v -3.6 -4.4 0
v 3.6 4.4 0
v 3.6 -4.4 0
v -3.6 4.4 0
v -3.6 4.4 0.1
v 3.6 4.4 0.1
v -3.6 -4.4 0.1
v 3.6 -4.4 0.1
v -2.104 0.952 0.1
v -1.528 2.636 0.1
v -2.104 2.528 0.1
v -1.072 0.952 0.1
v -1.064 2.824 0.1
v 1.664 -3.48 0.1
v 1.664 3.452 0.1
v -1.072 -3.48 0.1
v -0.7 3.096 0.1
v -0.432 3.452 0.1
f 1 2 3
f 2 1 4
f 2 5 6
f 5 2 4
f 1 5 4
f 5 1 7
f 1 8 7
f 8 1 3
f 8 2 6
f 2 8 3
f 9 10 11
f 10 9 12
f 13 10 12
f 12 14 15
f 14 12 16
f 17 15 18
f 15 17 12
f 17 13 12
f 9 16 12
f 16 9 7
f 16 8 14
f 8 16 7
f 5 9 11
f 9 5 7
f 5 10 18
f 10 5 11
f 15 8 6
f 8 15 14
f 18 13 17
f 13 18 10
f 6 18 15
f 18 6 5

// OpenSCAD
// file: ../p/4-4edge.scad
use <../lib.scad>
$fa=1; $fs=0.2;
function ldraw_lib__4_4edge(realsolid=false) = [
// 0 Circle 1.0
// 0 Name: 4-4edge.dat
// 0 Author: James Jessiman
// 0 !LDRAW_ORG Primitive UPDATE 2017-01
// 0 !LICENSE Licensed under CC BY 2.0 and CC BY 4.0 : see CAreadme.txt
// 
// 0 BFC CERTIFY CCW
  [0,"BFC","CERTIFY"],
  [0,"BFC","CCW"],
// 
// 0 !HISTORY 1998-12-15 [PTadmin] Official Update 1998-10
// 0 !HISTORY 2005-12-28 [PTadmin] Official Update 2005-01
// 0 !HISTORY 2007-06-24 [PTadmin] Header formatted for Contributor Agreement
// 0 !HISTORY 2008-07-01 [PTadmin] Official Update 2008-01
// 0 !HISTORY 2017-01-15 [Steffen] BFCed
// 0 !HISTORY 2017-12-30 [PTadmin] Official Update 2017-01
// 
// 
// 2 24 1 0 0 0.9239 0 0.3827
  [2,24,1,0,0,0.9239,0,0.3827],
// 2 24 0.9239 0 0.3827 0.7071 0 0.7071
  [2,24,0.9239,0,0.3827,0.7071,0,0.7071],
// 2 24 0.7071 0 0.7071 0.3827 0 0.9239
  [2,24,0.7071,0,0.7071,0.3827,0,0.9239],
// 2 24 0.3827 0 0.9239 0 0 1
  [2,24,0.3827,0,0.9239,0,0,1],
// 2 24 0 0 1 -0.3827 0 0.9239
  [2,24,0,0,1,-0.3827,0,0.9239],
// 2 24 -0.3827 0 0.9239 -0.7071 0 0.7071
  [2,24,-0.3827,0,0.9239,-0.7071,0,0.7071],
// 2 24 -0.7071 0 0.7071 -0.9239 0 0.3827
  [2,24,-0.7071,0,0.7071,-0.9239,0,0.3827],
// 2 24 -0.9239 0 0.3827 -1 0 -0
  [2,24,-0.9239,0,0.3827,-1,0,-0],
// 2 24 -1 0 -0 -0.9239 0 -0.3827
  [2,24,-1,0,-0,-0.9239,0,-0.3827],
// 2 24 -0.9239 0 -0.3827 -0.7071 0 -0.7071
  [2,24,-0.9239,0,-0.3827,-0.7071,0,-0.7071],
// 2 24 -0.7071 0 -0.7071 -0.3827 0 -0.9239
  [2,24,-0.7071,0,-0.7071,-0.3827,0,-0.9239],
// 2 24 -0.3827 0 -0.9239 0 0 -1
  [2,24,-0.3827,0,-0.9239,0,0,-1],
// 2 24 0 0 -1 0.3827 0 -0.9239
  [2,24,0,0,-1,0.3827,0,-0.9239],
// 2 24 0.3827 0 -0.9239 0.7071 0 -0.7071
  [2,24,0.3827,0,-0.9239,0.7071,0,-0.7071],
// 2 24 0.7071 0 -0.7071 0.9239 0 -0.3827
  [2,24,0.7071,0,-0.7071,0.9239,0,-0.3827],
// 2 24 0.9239 0 -0.3827 1 0 0
  [2,24,0.9239,0,-0.3827,1,0,0],
];
module ldraw_lib__4_4edge(step=0, col=false, unit=2/5, alt=false, line=0.2, solid=!$preview)
    makepoly(ldraw_lib__4_4edge(solid), step=step, col=col, unit=unit, alt=alt, line=line, solid=solid);
ldraw_lib__4_4edge(line=0.2);
// file: ../p/4-4disc.scad
use <../lib.scad>
$fa=1; $fs=0.2;
function ldraw_lib__4_4disc(realsolid=false) = [
// 0 Disc 1.0
// 0 Name: 4-4disc.dat
// 0 Author: James Jessiman
// 0 !LDRAW_ORG Primitive UPDATE 2002-02
// 0 !LICENSE Licensed under CC BY 2.0 and CC BY 4.0 : see CAreadme.txt
// 
// 0 BFC CERTIFY CCW
  [0,"BFC","CERTIFY"],
  [0,"BFC","CCW"],
// 
// 0 !HISTORY 1998-12-15 [PTadmin] Official Update 1998-10
// 0 !HISTORY 2002-03-23 [sbliss] Added BFC statement
// 0 !HISTORY 2002-04-25 [PTadmin] Official Update 2002-02
// 0 !HISTORY 2007-06-24 [PTadmin] Header formatted for Contributor Agreement
// 0 !HISTORY 2008-07-01 [PTadmin] Official Update 2008-01
// 
// 
// 3 16 0 0 0 1 0 0 0.9239 0 0.3827
  [3,16,0,0,0,1,0,0,0.9239,0,0.3827],
// 3 16 0 0 0 0.9239 0 0.3827 0.7071 0 0.7071
  [3,16,0,0,0,0.9239,0,0.3827,0.7071,0,0.7071],
// 3 16 0 0 0 0.7071 0 0.7071 0.3827 0 0.9239
  [3,16,0,0,0,0.7071,0,0.7071,0.3827,0,0.9239],
// 3 16 0 0 0 0.3827 0 0.9239 0 0 1
  [3,16,0,0,0,0.3827,0,0.9239,0,0,1],
// 3 16 0 0 0 0 0 1 -0.3827 0 0.9239
  [3,16,0,0,0,0,0,1,-0.3827,0,0.9239],
// 3 16 0 0 0 -0.3827 0 0.9239 -0.7071 0 0.7071
  [3,16,0,0,0,-0.3827,0,0.9239,-0.7071,0,0.7071],
// 3 16 0 0 0 -0.7071 0 0.7071 -0.9239 0 0.3827
  [3,16,0,0,0,-0.7071,0,0.7071,-0.9239,0,0.3827],
// 3 16 0 0 0 -0.9239 0 0.3827 -1 0 -0
  [3,16,0,0,0,-0.9239,0,0.3827,-1,0,-0],
// 3 16 0 0 0 -1 0 -0 -0.9239 0 -0.3827
  [3,16,0,0,0,-1,0,-0,-0.9239,0,-0.3827],
// 3 16 0 0 0 -0.9239 0 -0.3827 -0.7071 0 -0.7071
  [3,16,0,0,0,-0.9239,0,-0.3827,-0.7071,0,-0.7071],
// 3 16 0 0 0 -0.7071 0 -0.7071 -0.3827 0 -0.9239
  [3,16,0,0,0,-0.7071,0,-0.7071,-0.3827,0,-0.9239],
// 3 16 0 0 0 -0.3827 0 -0.9239 0 0 -1
  [3,16,0,0,0,-0.3827,0,-0.9239,0,0,-1],
// 3 16 0 0 0 0 0 -1 0.3827 0 -0.9239
  [3,16,0,0,0,0,0,-1,0.3827,0,-0.9239],
// 3 16 0 0 0 0.3827 0 -0.9239 0.7071 0 -0.7071
  [3,16,0,0,0,0.3827,0,-0.9239,0.7071,0,-0.7071],
// 3 16 0 0 0 0.7071 0 -0.7071 0.9239 0 -0.3827
  [3,16,0,0,0,0.7071,0,-0.7071,0.9239,0,-0.3827],
// 3 16 0 0 0 0.9239 0 -0.3827 1 0 0
  [3,16,0,0,0,0.9239,0,-0.3827,1,0,0],
// 0
];
module ldraw_lib__4_4disc(step=0, col=false, unit=2/5, alt=false, line=0.2, solid=!$preview)
    makepoly(ldraw_lib__4_4disc(solid), step=step, col=col, unit=unit, alt=alt, line=line, solid=solid);
ldraw_lib__4_4disc(line=0.2);
// file: ../p/4-4cyli.scad
use <../lib.scad>
$fa=1; $fs=0.2;
function ldraw_lib__4_4cyli(realsolid=false) = [
// 0 Cylinder 1.0
// 0 Name: 4-4cyli.dat
// 0 Author: James Jessiman
// 0 !LDRAW_ORG Primitive UPDATE 2005-01
// 0 !LICENSE Licensed under CC BY 2.0 and CC BY 4.0 : see CAreadme.txt
// 
// 0 BFC CERTIFY CCW
  [0,"BFC","CERTIFY"],
  [0,"BFC","CCW"],
// 
// 0 !HISTORY 1998-12-15 [PTadmin] Official Update 1998-10
// 0 !HISTORY 2002-03-23 [sbliss] Added BFC statement; merged headers from files in distributions LDraw 0.27 and Complete.
// 0 !HISTORY 2002-04-25 [PTadmin] Official Update 2002-02
// 0 !HISTORY 2004-12-14 [guyvivan] BFC CCW
// 0 !HISTORY 2005-12-28 [PTadmin] Official Update 2005-01
// 0 !HISTORY 2007-06-24 [PTadmin] Header formatted for Contributor Agreement
// 0 !HISTORY 2008-07-01 [PTadmin] Official Update 2008-01
// 
// 
// 4 16 1 1 0 0.9239 1 0.3827 0.9239 0 0.3827 1 0 0
  [4,16,1,1,0,0.9239,1,0.3827,0.9239,0,0.3827,1,0,0],
// 5 24 1 0 0 1 1 0 0.9239 0 0.3827 0.9239 0 -0.3827
  [5,24,1,0,0,1,1,0,0.9239,0,0.3827,0.9239,0,-0.3827],
// 4 16 0.9239 1 0.3827 0.7071 1 0.7071 0.7071 0 0.7071 0.9239 0 0.3827
  [4,16,0.9239,1,0.3827,0.7071,1,0.7071,0.7071,0,0.7071,0.9239,0,0.3827],
// 5 24 0.9239 0 0.3827 0.9239 1 0.3827 0.7071 0 0.7071 1 0 0
  [5,24,0.9239,0,0.3827,0.9239,1,0.3827,0.7071,0,0.7071,1,0,0],
// 4 16 0.7071 1 0.7071 0.3827 1 0.9239 0.3827 0 0.9239 0.7071 0 0.7071
  [4,16,0.7071,1,0.7071,0.3827,1,0.9239,0.3827,0,0.9239,0.7071,0,0.7071],
// 5 24 0.7071 0 0.7071 0.7071 1 0.7071 0.3827 0 0.9239 0.9239 0 0.3827
  [5,24,0.7071,0,0.7071,0.7071,1,0.7071,0.3827,0,0.9239,0.9239,0,0.3827],
// 4 16 0.3827 1 0.9239 0 1 1 0 0 1 0.3827 0 0.9239
  [4,16,0.3827,1,0.9239,0,1,1,0,0,1,0.3827,0,0.9239],
// 5 24 0.3827 0 0.9239 0.3827 1 0.9239 0 0 1 0.7071 0 0.7071
  [5,24,0.3827,0,0.9239,0.3827,1,0.9239,0,0,1,0.7071,0,0.7071],
// 4 16 0 1 1 -0.3827 1 0.9239 -0.3827 0 0.9239 0 0 1
  [4,16,0,1,1,-0.3827,1,0.9239,-0.3827,0,0.9239,0,0,1],
// 5 24 0 0 1 0 1 1 -0.3827 0 0.9239 0.3827 0 0.9239
  [5,24,0,0,1,0,1,1,-0.3827,0,0.9239,0.3827,0,0.9239],
// 4 16 -0.3827 1 0.9239 -0.7071 1 0.7071 -0.7071 0 0.7071 -0.3827 0 0.9239
  [4,16,-0.3827,1,0.9239,-0.7071,1,0.7071,-0.7071,0,0.7071,-0.3827,0,0.9239],
// 5 24 -0.3827 0 0.9239 -0.3827 1 0.9239 -0.7071 0 0.7071 0 0 1
  [5,24,-0.3827,0,0.9239,-0.3827,1,0.9239,-0.7071,0,0.7071,0,0,1],
// 4 16 -0.7071 1 0.7071 -0.9239 1 0.3827 -0.9239 0 0.3827 -0.7071 0 0.7071
  [4,16,-0.7071,1,0.7071,-0.9239,1,0.3827,-0.9239,0,0.3827,-0.7071,0,0.7071],
// 5 24 -0.7071 0 0.7071 -0.7071 1 0.7071 -0.9239 0 0.3827 -0.3827 0 0.9239
  [5,24,-0.7071,0,0.7071,-0.7071,1,0.7071,-0.9239,0,0.3827,-0.3827,0,0.9239],
// 4 16 -0.9239 1 0.3827 -1 1 0 -1 0 0 -0.9239 0 0.3827
  [4,16,-0.9239,1,0.3827,-1,1,0,-1,0,0,-0.9239,0,0.3827],
// 5 24 -0.9239 0 0.3827 -0.9239 1 0.3827 -1 0 0 -0.7071 0 0.7071
  [5,24,-0.9239,0,0.3827,-0.9239,1,0.3827,-1,0,0,-0.7071,0,0.7071],
// 4 16 -1 1 0 -0.9239 1 -0.3827 -0.9239 0 -0.3827 -1 0 0
  [4,16,-1,1,0,-0.9239,1,-0.3827,-0.9239,0,-0.3827,-1,0,0],
// 5 24 -1 0 0 -1 1 0 -0.9239 0 -0.3827 -0.9239 0 0.3827
  [5,24,-1,0,0,-1,1,0,-0.9239,0,-0.3827,-0.9239,0,0.3827],
// 4 16 -0.9239 1 -0.3827 -0.7071 1 -0.7071 -0.7071 0 -0.7071 -0.9239 0 -0.3827
  [4,16,-0.9239,1,-0.3827,-0.7071,1,-0.7071,-0.7071,0,-0.7071,-0.9239,0,-0.3827],
// 5 24 -0.9239 0 -0.3827 -0.9239 1 -0.3827 -0.7071 0 -0.7071 -1 0 0
  [5,24,-0.9239,0,-0.3827,-0.9239,1,-0.3827,-0.7071,0,-0.7071,-1,0,0],
// 4 16 -0.7071 1 -0.7071 -0.3827 1 -0.9239 -0.3827 0 -0.9239 -0.7071 0 -0.7071
  [4,16,-0.7071,1,-0.7071,-0.3827,1,-0.9239,-0.3827,0,-0.9239,-0.7071,0,-0.7071],
// 5 24 -0.7071 0 -0.7071 -0.7071 1 -0.7071 -0.3827 0 -0.9239 -0.9239 0 -0.3827
  [5,24,-0.7071,0,-0.7071,-0.7071,1,-0.7071,-0.3827,0,-0.9239,-0.9239,0,-0.3827],
// 4 16 -0.3827 1 -0.9239 0 1 -1 0 0 -1 -0.3827 0 -0.9239
  [4,16,-0.3827,1,-0.9239,0,1,-1,0,0,-1,-0.3827,0,-0.9239],
// 5 24 -0.3827 0 -0.9239 -0.3827 1 -0.9239 0 0 -1 -0.7071 0 -0.7071
  [5,24,-0.3827,0,-0.9239,-0.3827,1,-0.9239,0,0,-1,-0.7071,0,-0.7071],
// 4 16 0 1 -1 0.3827 1 -0.9239 0.3827 0 -0.9239 0 0 -1
  [4,16,0,1,-1,0.3827,1,-0.9239,0.3827,0,-0.9239,0,0,-1],
// 5 24 0 0 -1 0 1 -1 0.3827 0 -0.9239 -0.3827 0 -0.9239
  [5,24,0,0,-1,0,1,-1,0.3827,0,-0.9239,-0.3827,0,-0.9239],
// 4 16 0.3827 1 -0.9239 0.7071 1 -0.7071 0.7071 0 -0.7071 0.3827 0 -0.9239
  [4,16,0.3827,1,-0.9239,0.7071,1,-0.7071,0.7071,0,-0.7071,0.3827,0,-0.9239],
// 5 24 0.3827 0 -0.9239 0.3827 1 -0.9239 0.7071 0 -0.7071 0 0 -1
  [5,24,0.3827,0,-0.9239,0.3827,1,-0.9239,0.7071,0,-0.7071,0,0,-1],
// 4 16 0.7071 1 -0.7071 0.9239 1 -0.3827 0.9239 0 -0.3827 0.7071 0 -0.7071
  [4,16,0.7071,1,-0.7071,0.9239,1,-0.3827,0.9239,0,-0.3827,0.7071,0,-0.7071],
// 5 24 0.7071 0 -0.7071 0.7071 1 -0.7071 0.9239 0 -0.3827 0.3827 0 -0.9239
  [5,24,0.7071,0,-0.7071,0.7071,1,-0.7071,0.9239,0,-0.3827,0.3827,0,-0.9239],
// 4 16 0.9239 1 -0.3827 1 1 0 1 0 0 0.9239 0 -0.3827
  [4,16,0.9239,1,-0.3827,1,1,0,1,0,0,0.9239,0,-0.3827],
// 5 24 0.9239 0 -0.3827 0.9239 1 -0.3827 1 0 0 0.7071 0 -0.7071
  [5,24,0.9239,0,-0.3827,0.9239,1,-0.3827,1,0,0,0.7071,0,-0.7071],
// 0
];
module ldraw_lib__4_4cyli(step=0, col=false, unit=2/5, alt=false, line=0.2, solid=!$preview)
    makepoly(ldraw_lib__4_4cyli(solid), step=step, col=col, unit=unit, alt=alt, line=line, solid=solid);
ldraw_lib__4_4cyli(line=0.2);
// file: ../p/stud3.scad
use <../lib.scad>
use <4-4cyli.scad>
use <4-4disc.scad>
use <4-4edge.scad>
$fa=1; $fs=0.2;
function ldraw_lib__stud3(realsolid=false) = realsolid ? 
    [openscad(translate([0,0,-eps()], o=cylinder(4+eps(), r=4)),2)] : [
// 0 Stud Tube Solid
// 0 Name: stud3.dat
// 0 Author: James Jessiman
// 0 !LDRAW_ORG Primitive UPDATE 2012-01
// 0 !LICENSE Licensed under CC BY 2.0 and CC BY 4.0 : see CAreadme.txt
// 
// 0 BFC CERTIFY CCW
  [0,"BFC","CERTIFY"],
  [0,"BFC","CCW"],
// 
// 0 !HISTORY 2002-04-04 [sbliss] Modified for BFC compliance
// 0 !HISTORY 2002-04-25 [PTadmin] Official Update 2002-02
// 0 !HISTORY 2007-06-24 [PTadmin] Header formatted for Contributor Agreement
// 0 !HISTORY 2008-07-01 [PTadmin] Official Update 2008-01
// 0 !HISTORY 2012-02-16 [Philo] Changed to CCW
// 0 !HISTORY 2012-03-30 [PTadmin] Official Update 2012-01
// 
// 
// 1 16 0 -4 0 4 0 0 0 1 0 0 0 4 4-4edge.dat
  [1,16,0,-4,0,4,0,0,0,1,0,0,0,4, ldraw_lib__4_4edge(realsolid)],
// 1 16 0 0 0 4 0 0 0 1 0 0 0 4 4-4edge.dat
  [1,16,0,0,0,4,0,0,0,1,0,0,0,4, ldraw_lib__4_4edge(realsolid)],
// 1 16 0 -4 0 4 0 0 0 1 0 0 0 4 4-4disc.dat
  [1,16,0,-4,0,4,0,0,0,1,0,0,0,4, ldraw_lib__4_4disc(realsolid)],
// 1 16 0 -4 0 4 0 0 0 4 0 0 0 4 4-4cyli.dat
  [1,16,0,-4,0,4,0,0,0,4,0,0,0,4, ldraw_lib__4_4cyli(realsolid)],
];
module ldraw_lib__stud3(step=0, col=false, unit=2/5, alt=false, line=0.2, solid=!$preview)
    makepoly(ldraw_lib__stud3(solid), step=step, col=col, unit=unit, alt=alt, line=line, solid=solid);
ldraw_lib__stud3(line=0.2);
// file: ../p/stud.scad
use <../lib.scad>
use <4-4cyli.scad>
use <4-4disc.scad>
use <4-4edge.scad>
$fa=1; $fs=0.2;
function ldraw_lib__stud(realsolid=false) = realsolid ? 
    [openscad(translate([0,0,-eps()], o=cylinder(4+eps(), r=6)),2)] : [
// 0 Stud
// 0 Name: stud.dat
// 0 Author: James Jessiman
// 0 !LDRAW_ORG Primitive UPDATE 2012-01
// 0 !LICENSE Licensed under CC BY 2.0 and CC BY 4.0 : see CAreadme.txt
// 
// 0 BFC CERTIFY CCW
  [0,"BFC","CERTIFY"],
  [0,"BFC","CCW"],
// 
// 0 !HISTORY 2002-04-04 [sbliss] Modified for BFC compliance
// 0 !HISTORY 2002-04-25 [PTadmin] Official Update 2002-02
// 0 !HISTORY 2007-06-24 [PTadmin] Header formatted for Contributor Agreement
// 0 !HISTORY 2008-07-01 [PTadmin] Official Update 2008-01
// 0 !HISTORY 2012-02-16 [Philo] Changed to CCW
// 0 !HISTORY 2012-03-30 [PTadmin] Official Update 2012-01
// 
// 
// 1 16 0 0 0 6 0 0 0 1 0 0 0 6 4-4edge.dat
  [1,16,0,0,0,6,0,0,0,1,0,0,0,6, ldraw_lib__4_4edge(realsolid)],
// 1 16 0 -4 0 6 0 0 0 1 0 0 0 6 4-4edge.dat
  [1,16,0,-4,0,6,0,0,0,1,0,0,0,6, ldraw_lib__4_4edge(realsolid)],
// 1 16 0 0 0 6 0 0 0 -4 0 0 0 6 4-4cyli.dat
  [1,16,0,0,0,6,0,0,0,-4,0,0,0,6, ldraw_lib__4_4cyli(realsolid)],
// 1 16 0 -4 0 6 0 0 0 1 0 0 0 6 4-4disc.dat
  [1,16,0,-4,0,6,0,0,0,1,0,0,0,6, ldraw_lib__4_4disc(realsolid)],
];
module ldraw_lib__stud(step=0, col=false, unit=2/5, alt=false, line=0.2, solid=!$preview)
    makepoly(ldraw_lib__stud(solid), step=step, col=col, unit=unit, alt=alt, line=line, solid=solid);
ldraw_lib__stud(line=0.2);
// file: ../p/box5.scad
use <../lib.scad>
$fa=1; $fs=0.2;
function ldraw_lib__box5(realsolid=false) = [
// 0 Box with 5 Faces and All Edges
// 0 Name: box5.dat
// 0 Author: James Jessiman
// 0 !LDRAW_ORG Primitive UPDATE 2012-01
// 0 !LICENSE Licensed under CC BY 2.0 and CC BY 4.0 : see CAreadme.txt
// 
// 0 BFC CERTIFY CCW
  [0,"BFC","CERTIFY"],
  [0,"BFC","CCW"],
// 
// 0 !HISTORY 2002-04-03 [sbliss] Modified for BFC compliance
// 0 !HISTORY 2002-04-25 [PTadmin] Official Update 2002-02
// 0 !HISTORY 2007-06-24 [PTadmin] Header formatted for Contributor Agreement
// 0 !HISTORY 2008-07-01 [PTadmin] Official Update 2008-01
// 0 !HISTORY 2012-02-16 [Philo] Changed to CCW
// 0 !HISTORY 2012-03-30 [PTadmin] Official Update 2012-01
// 
// 
// 2 24 1 1 1 -1 1 1
  [2,24,1,1,1,-1,1,1],
// 2 24 -1 1 1 -1 1 -1
  [2,24,-1,1,1,-1,1,-1],
// 2 24 -1 1 -1 1 1 -1
  [2,24,-1,1,-1,1,1,-1],
// 2 24 1 1 -1 1 1 1
  [2,24,1,1,-1,1,1,1],
// 2 24 1 0 1 -1 0 1
  [2,24,1,0,1,-1,0,1],
// 2 24 -1 0 1 -1 0 -1
  [2,24,-1,0,1,-1,0,-1],
// 2 24 -1 0 -1 1 0 -1
  [2,24,-1,0,-1,1,0,-1],
// 2 24 1 0 -1 1 0 1
  [2,24,1,0,-1,1,0,1],
// 2 24 1 0 1 1 1 1
  [2,24,1,0,1,1,1,1],
// 2 24 -1 0 1 -1 1 1
  [2,24,-1,0,1,-1,1,1],
// 2 24 1 0 -1 1 1 -1
  [2,24,1,0,-1,1,1,-1],
// 2 24 -1 0 -1 -1 1 -1
  [2,24,-1,0,-1,-1,1,-1],
// 4 16 -1 1 1 1 1 1 1 1 -1 -1 1 -1
  [4,16,-1,1,1,1,1,1,1,1,-1,-1,1,-1],
// 4 16 -1 1 1 -1 0 1 1 0 1 1 1 1
  [4,16,-1,1,1,-1,0,1,1,0,1,1,1,1],
// 4 16 -1 1 -1 -1 0 -1 -1 0 1 -1 1 1
  [4,16,-1,1,-1,-1,0,-1,-1,0,1,-1,1,1],
// 4 16 1 1 -1 1 0 -1 -1 0 -1 -1 1 -1
  [4,16,1,1,-1,1,0,-1,-1,0,-1,-1,1,-1],
// 4 16 1 1 1 1 0 1 1 0 -1 1 1 -1
  [4,16,1,1,1,1,0,1,1,0,-1,1,1,-1],
];
module ldraw_lib__box5(step=0, col=false, unit=2/5, alt=false, line=0.2, solid=!$preview)
    makepoly(ldraw_lib__box5(solid), step=step, col=col, unit=unit, alt=alt, line=line, solid=solid);
ldraw_lib__box5(line=0.2);
// file: ../p/box4t.scad
use <../lib.scad>
$fa=1; $fs=0.2;
function ldraw_lib__box4t(realsolid=false) = [
// 0 Box with 4 Adjacent Faces and All Edges
// 0 Name: box4t.dat
// 0 Author: Tore Eriksson [Tore_Eriksson]
// 0 !LDRAW_ORG Primitive UPDATE 2003-02
// 0 !LICENSE Licensed under CC BY 2.0 and CC BY 4.0 : see CAreadme.txt
// 
// 0 BFC CERTIFY CCW
  [0,"BFC","CERTIFY"],
  [0,"BFC","CCW"],
// 
// 0 !HISTORY 1997-09-29 [PTadmin] Official Update 1997-15
// 0 !HISTORY 2002-08-31 [izanette] Modified with WINDZ for BFC compliance
// 0 !HISTORY 2003-08-01 [PTadmin] Official Update 2003-02
// 0 !HISTORY 2007-06-24 [PTadmin] Header formatted for Contributor Agreement
// 0 !HISTORY 2008-07-01 [PTadmin] Official Update 2008-01
// 
// 
// 2 24 1 1 1 -1 1 1
  [2,24,1,1,1,-1,1,1],
// 2 24 -1 1 1 -1 1 -1
  [2,24,-1,1,1,-1,1,-1],
// 2 24 -1 1 -1 1 1 -1
  [2,24,-1,1,-1,1,1,-1],
// 2 24 1 1 -1 1 1 1
  [2,24,1,1,-1,1,1,1],
// 2 24 1 0 1 -1 0 1
  [2,24,1,0,1,-1,0,1],
// 2 24 -1 0 1 -1 0 -1
  [2,24,-1,0,1,-1,0,-1],
// 2 24 -1 0 -1 1 0 -1
  [2,24,-1,0,-1,1,0,-1],
// 2 24 1 0 -1 1 0 1
  [2,24,1,0,-1,1,0,1],
// 2 24 1 0 1 1 1 1
  [2,24,1,0,1,1,1,1],
// 2 24 -1 0 1 -1 1 1
  [2,24,-1,0,1,-1,1,1],
// 2 24 1 0 -1 1 1 -1
  [2,24,1,0,-1,1,1,-1],
// 2 24 -1 0 -1 -1 1 -1
  [2,24,-1,0,-1,-1,1,-1],
// 4 16 1 1 1 1 1 -1 -1 1 -1 -1 1 1
  [4,16,1,1,1,1,1,-1,-1,1,-1,-1,1,1],
// 4 16 1 1 1 -1 1 1 -1 0 1 1 0 1
  [4,16,1,1,1,-1,1,1,-1,0,1,1,0,1],
// 4 16 -1 1 1 -1 1 -1 -1 0 -1 -1 0 1
  [4,16,-1,1,1,-1,1,-1,-1,0,-1,-1,0,1],
// 0 4 16 -1 1 -1 -1 0 -1 1 0 -1 1 1 -1
// 4 16 1 1 -1 1 1 1 1 0 1 1 0 -1
  [4,16,1,1,-1,1,1,1,1,0,1,1,0,-1],
// 0
];
module ldraw_lib__box4t(step=0, col=false, unit=2/5, alt=false, line=0.2, solid=!$preview)
    makepoly(ldraw_lib__box4t(solid), step=step, col=col, unit=unit, alt=alt, line=line, solid=solid);
ldraw_lib__box4t(line=0.2);
// file: s/3004s01.scad
use <../../lib.scad>
use <../../p/box4t.scad>
use <../../p/box5.scad>
use <../../p/stud.scad>
use <../../p/stud3.scad>
$fa=1; $fs=0.2;
function ldraw_lib__s__3004s01(realsolid=false) = [
// 0 ~Brick  1 x  2 without Front Face
// 0 Name: s\3004s01.dat
// 0 Author: James Jessiman
// 0 !LDRAW_ORG Subpart UPDATE 2003-03
// 0 !LICENSE Licensed under CC BY 2.0 and CC BY 4.0 : see CAreadme.txt
// 
// 0 BFC CERTIFY CCW
  [0,"BFC","CERTIFY"],
  [0,"BFC","CCW"],
// 
// 0 !HISTORY 2003-09-07 [jriley] Subfiling, BFC
// 0 !HISTORY 2003-12-19 [PTadmin] Official Update 2003-03
// 0 !HISTORY 2007-08-29 [PTadmin] Header formatted for Contributor Agreement
// 0 !HISTORY 2008-07-01 [PTadmin] Official Update 2008-01
// 
// 
// 1 16 0 4 0 1 0 0 0 -5 0 0 0 1 stud3.dat
  [1,16,0,4,0,1,0,0,0,-5,0,0,0,1, ldraw_lib__stud3(realsolid)],
// 0 BFC INVERTNEXT
  [0,"BFC","INVERTNEXT"],
// 1 16 0 24 0 16 0 0 0 -20 0 0 0 6 box5.dat
  [1,16,0,24,0,16,0,0,0,-20,0,0,0,6, ldraw_lib__box5(realsolid)],
// 4 16 20 24 10 16 24 6 -16 24 6 -20 24 10
  [4,16,20,24,10,16,24,6,-16,24,6,-20,24,10],
// 4 16 -20 24 10 -16 24 6 -16 24 -6 -20 24 -10
  [4,16,-20,24,10,-16,24,6,-16,24,-6,-20,24,-10],
// 4 16 -20 24 -10 -16 24 -6 16 24 -6 20 24 -10
  [4,16,-20,24,-10,-16,24,-6,16,24,-6,20,24,-10],
// 4 16 20 24 -10 16 24 -6 16 24 6 20 24 10
  [4,16,20,24,-10,16,24,-6,16,24,6,20,24,10],
// 1 16 0 24 0 20 0 0 0 -24 0 0 0 10 box4t.dat
  [1,16,0,24,0,20,0,0,0,-24,0,0,0,10, ldraw_lib__box4t(realsolid)],
// 1 16 10 0 0 1 0 0 0 1 0 0 0 1 stud.dat
  [1,16,10,0,0,1,0,0,0,1,0,0,0,1, ldraw_lib__stud(realsolid)],
// 1 16 -10 0 0 1 0 0 0 1 0 0 0 1 stud.dat
  [1,16,-10,0,0,1,0,0,0,1,0,0,0,1, ldraw_lib__stud(realsolid)],
// 0
];
module ldraw_lib__s__3004s01(step=0, col=false, unit=2/5, alt=false, line=0.2, solid=!$preview)
    makepoly(ldraw_lib__s__3004s01(solid), step=step, col=col, unit=unit, alt=alt, line=line, solid=solid);
ldraw_lib__s__3004s01(line=0.2);
// file: 3004.scad
use <../lib.scad>
use <s/3004s01.scad>
$fa=1; $fs=0.2;
function ldraw_lib__3004(realsolid=false) = [
// 0 Brick  1 x  2
// 0 Name: 3004.dat
// 0 Author: James Jessiman
// 0 !LDRAW_ORG Part UPDATE 2022-05
// 0 !LICENSE Licensed under CC BY 2.0 and CC BY 4.0 : see CAreadme.txt
// 
// 0 BFC CERTIFY CCW
  [0,"BFC","CERTIFY"],
  [0,"BFC","CCW"],
// 
// 0 !HISTORY 2001-10-26 [PTadmin] Official Update 2001-01
// 0 !HISTORY 2002-05-07 {unknown} BFC Certification
// 0 !HISTORY 2002-06-11 [PTadmin] Official Update 2002-03
// 0 !HISTORY 2007-05-07 [PTadmin] Header formatted for Contributor Agreement
// 0 !HISTORY 2008-07-01 [PTadmin] Official Update 2008-01
// 0 !HISTORY 2022-08-04 [MagFors] Using subfile
// 0 !HISTORY 2022-09-15 [PTadmin] Official Update 2022-05
// 
// 
// 1 16 0 0 0 1 0 0 0 1 0 0 0 1 s\3004s01.dat
  [1,16,0,0,0,1,0,0,0,1,0,0,0,1, ldraw_lib__s__3004s01(realsolid)],
// 4 16 -20 24 -10 20 24 -10 20 0 -10 -20 0 -10
  [4,16,-20,24,-10,20,24,-10,20,0,-10,-20,0,-10],
];
module ldraw_lib__3004(step=0, col=false, unit=2/5, alt=false, line=0.2, solid=!$preview)
    makepoly(ldraw_lib__3004(solid), step=step, col=col, unit=unit, alt=alt, line=line, solid=solid);
ldraw_lib__3004(line=0.2);
// file: ../p/box5-12.scad
use <../lib.scad>
$fa=1; $fs=0.2;
function ldraw_lib__box5_12(realsolid=false) = [
// 0 Box with 5 Faces without Any Edges
// 0 Name: box5-12.dat
// 0 Author: Chris Dee [cwdee]
// 0 !LDRAW_ORG Primitive UPDATE 2009-02
// 0 !LICENSE Licensed under CC BY 2.0 and CC BY 4.0 : see CAreadme.txt
// 
// 0 BFC CERTIFY CCW
  [0,"BFC","CERTIFY"],
  [0,"BFC","CCW"],
// 
// 0 !HISTORY 2009-09-03 [PTadmin] Official Update 2009-02
// 
// 
// 4 16 1 1 1 1 1 -1 -1 1 -1 -1 1 1
  [4,16,1,1,1,1,1,-1,-1,1,-1,-1,1,1],
// 4 16 -1 0 1 1 0 1 1 1 1 -1 1 1
  [4,16,-1,0,1,1,0,1,1,1,1,-1,1,1],
// 4 16 -1 0 -1 -1 0 1 -1 1 1 -1 1 -1
  [4,16,-1,0,-1,-1,0,1,-1,1,1,-1,1,-1],
// 4 16 1 0 -1 -1 0 -1 -1 1 -1 1 1 -1
  [4,16,1,0,-1,-1,0,-1,-1,1,-1,1,1,-1],
// 4 16 1 0 1 1 0 -1 1 1 -1 1 1 1
  [4,16,1,0,1,1,0,-1,1,1,-1,1,1,1],
// 0
];
module ldraw_lib__box5_12(step=0, col=false, unit=2/5, alt=false, line=0.2, solid=!$preview)
    makepoly(ldraw_lib__box5_12(solid), step=step, col=col, unit=unit, alt=alt, line=line, solid=solid);
ldraw_lib__box5_12(line=0.2);
// main file
use <../lib.scad>
use <../p/box5-12.scad>
$fa=1; $fs=0.2;
function ldraw_lib__820672h(realsolid=false) = [
// 0 Sticker  1.1 x  0.9 with Black Bold "1" on White Background
// 0 Name: 820672h.dat
// 0 Author: Takeshi Takahashi [RainbowDolphin]
// 0 !LDRAW_ORG Part UPDATE 2022-05
// 0 !LICENSE Licensed under CC BY 2.0 and CC BY 4.0 : see CAreadme.txt
// 
// 0 BFC CERTIFY CCW
  [0,"BFC","CERTIFY"],
  [0,"BFC","CCW"],
// 
// 0 !KEYWORDS harbour, Pier, Seaport, Set 6541, wharf
// 
// 0 !HISTORY 2022-09-15 [PTadmin] Official Update 2022-05
// 
// 
// 1 16 0 -0.25 0 9 0 0 0 0.25 0 0 0 11 box5-12.dat
  [1,16,0,-0.25,0,9,0,0,0,0.25,0,0,0,11, ldraw_lib__box5_12(realsolid)],
// 4 0 -3.82 -0.25 6.59 -5.26 -0.25 6.32 -5.26 -0.25 2.38 -2.68 -0.25 2.38
  [4,0,-3.82,-0.25,6.59,-5.26,-0.25,6.32,-5.26,-0.25,2.38,-2.68,-0.25,2.38],
// 3 0 -2.66 -0.25 7.06 -3.82 -0.25 6.59 -2.68 -0.25 2.38
  [3,0,-2.66,-0.25,7.06,-3.82,-0.25,6.59,-2.68,-0.25,2.38],
// 4 0 -2.68 -0.25 2.38 -2.68 -0.25 -8.7 4.16 -0.25 -8.7 4.16 -0.25 8.63
  [4,0,-2.68,-0.25,2.38,-2.68,-0.25,-8.7,4.16,-0.25,-8.7,4.16,-0.25,8.63],
// 4 0 -1.75 -0.25 7.74 -2.68 -0.25 2.38 4.16 -0.25 8.63 -1.08 -0.25 8.63
  [4,0,-1.75,-0.25,7.74,-2.68,-0.25,2.38,4.16,-0.25,8.63,-1.08,-0.25,8.63],
// 3 0 -1.75 -0.25 7.74 -2.66 -0.25 7.06 -2.68 -0.25 2.38
  [3,0,-1.75,-0.25,7.74,-2.66,-0.25,7.06,-2.68,-0.25,2.38],
// 4 15 -5.26 -0.25 2.38 -9 -0.25 -11 -2.68 -0.25 -8.7 -2.68 -0.25 2.38
  [4,15,-5.26,-0.25,2.38,-9,-0.25,-11,-2.68,-0.25,-8.7,-2.68,-0.25,2.38],
// 4 15 -2.68 -0.25 -8.7 -9 -0.25 -11 9 -0.25 -11 4.16 -0.25 -8.7
  [4,15,-2.68,-0.25,-8.7,-9,-0.25,-11,9,-0.25,-11,4.16,-0.25,-8.7],
// 4 15 -9 -0.25 11 -9 -0.25 -11 -5.26 -0.25 2.38 -5.26 -0.25 6.32
  [4,15,-9,-0.25,11,-9,-0.25,-11,-5.26,-0.25,2.38,-5.26,-0.25,6.32],
// 4 15 -1.08 -0.25 8.63 -9 -0.25 11 -5.26 -0.25 6.32 -3.82 -0.25 6.59
  [4,15,-1.08,-0.25,8.63,-9,-0.25,11,-5.26,-0.25,6.32,-3.82,-0.25,6.59],
// 4 15 4.16 -0.25 8.63 4.16 -0.25 -8.7 9 -0.25 -11 9 -0.25 11
  [4,15,4.16,-0.25,8.63,4.16,-0.25,-8.7,9,-0.25,-11,9,-0.25,11],
// 4 15 -2.66 -0.25 7.06 -1.75 -0.25 7.74 -1.08 -0.25 8.63 -3.82 -0.25 6.59
  [4,15,-2.66,-0.25,7.06,-1.75,-0.25,7.74,-1.08,-0.25,8.63,-3.82,-0.25,6.59],
// 4 15 -1.08 -0.25 8.63 4.16 -0.25 8.63 9 -0.25 11 -9 -0.25 11
  [4,15,-1.08,-0.25,8.63,4.16,-0.25,8.63,9,-0.25,11,-9,-0.25,11],
];
module ldraw_lib__820672h(step=0, col=false, unit=2/5, alt=false, line=0.2, solid=!$preview)
    makepoly(ldraw_lib__820672h(solid), step=step, col=col, unit=unit, alt=alt, line=line, solid=solid);
ldraw_lib__820672h(line=0.2);
